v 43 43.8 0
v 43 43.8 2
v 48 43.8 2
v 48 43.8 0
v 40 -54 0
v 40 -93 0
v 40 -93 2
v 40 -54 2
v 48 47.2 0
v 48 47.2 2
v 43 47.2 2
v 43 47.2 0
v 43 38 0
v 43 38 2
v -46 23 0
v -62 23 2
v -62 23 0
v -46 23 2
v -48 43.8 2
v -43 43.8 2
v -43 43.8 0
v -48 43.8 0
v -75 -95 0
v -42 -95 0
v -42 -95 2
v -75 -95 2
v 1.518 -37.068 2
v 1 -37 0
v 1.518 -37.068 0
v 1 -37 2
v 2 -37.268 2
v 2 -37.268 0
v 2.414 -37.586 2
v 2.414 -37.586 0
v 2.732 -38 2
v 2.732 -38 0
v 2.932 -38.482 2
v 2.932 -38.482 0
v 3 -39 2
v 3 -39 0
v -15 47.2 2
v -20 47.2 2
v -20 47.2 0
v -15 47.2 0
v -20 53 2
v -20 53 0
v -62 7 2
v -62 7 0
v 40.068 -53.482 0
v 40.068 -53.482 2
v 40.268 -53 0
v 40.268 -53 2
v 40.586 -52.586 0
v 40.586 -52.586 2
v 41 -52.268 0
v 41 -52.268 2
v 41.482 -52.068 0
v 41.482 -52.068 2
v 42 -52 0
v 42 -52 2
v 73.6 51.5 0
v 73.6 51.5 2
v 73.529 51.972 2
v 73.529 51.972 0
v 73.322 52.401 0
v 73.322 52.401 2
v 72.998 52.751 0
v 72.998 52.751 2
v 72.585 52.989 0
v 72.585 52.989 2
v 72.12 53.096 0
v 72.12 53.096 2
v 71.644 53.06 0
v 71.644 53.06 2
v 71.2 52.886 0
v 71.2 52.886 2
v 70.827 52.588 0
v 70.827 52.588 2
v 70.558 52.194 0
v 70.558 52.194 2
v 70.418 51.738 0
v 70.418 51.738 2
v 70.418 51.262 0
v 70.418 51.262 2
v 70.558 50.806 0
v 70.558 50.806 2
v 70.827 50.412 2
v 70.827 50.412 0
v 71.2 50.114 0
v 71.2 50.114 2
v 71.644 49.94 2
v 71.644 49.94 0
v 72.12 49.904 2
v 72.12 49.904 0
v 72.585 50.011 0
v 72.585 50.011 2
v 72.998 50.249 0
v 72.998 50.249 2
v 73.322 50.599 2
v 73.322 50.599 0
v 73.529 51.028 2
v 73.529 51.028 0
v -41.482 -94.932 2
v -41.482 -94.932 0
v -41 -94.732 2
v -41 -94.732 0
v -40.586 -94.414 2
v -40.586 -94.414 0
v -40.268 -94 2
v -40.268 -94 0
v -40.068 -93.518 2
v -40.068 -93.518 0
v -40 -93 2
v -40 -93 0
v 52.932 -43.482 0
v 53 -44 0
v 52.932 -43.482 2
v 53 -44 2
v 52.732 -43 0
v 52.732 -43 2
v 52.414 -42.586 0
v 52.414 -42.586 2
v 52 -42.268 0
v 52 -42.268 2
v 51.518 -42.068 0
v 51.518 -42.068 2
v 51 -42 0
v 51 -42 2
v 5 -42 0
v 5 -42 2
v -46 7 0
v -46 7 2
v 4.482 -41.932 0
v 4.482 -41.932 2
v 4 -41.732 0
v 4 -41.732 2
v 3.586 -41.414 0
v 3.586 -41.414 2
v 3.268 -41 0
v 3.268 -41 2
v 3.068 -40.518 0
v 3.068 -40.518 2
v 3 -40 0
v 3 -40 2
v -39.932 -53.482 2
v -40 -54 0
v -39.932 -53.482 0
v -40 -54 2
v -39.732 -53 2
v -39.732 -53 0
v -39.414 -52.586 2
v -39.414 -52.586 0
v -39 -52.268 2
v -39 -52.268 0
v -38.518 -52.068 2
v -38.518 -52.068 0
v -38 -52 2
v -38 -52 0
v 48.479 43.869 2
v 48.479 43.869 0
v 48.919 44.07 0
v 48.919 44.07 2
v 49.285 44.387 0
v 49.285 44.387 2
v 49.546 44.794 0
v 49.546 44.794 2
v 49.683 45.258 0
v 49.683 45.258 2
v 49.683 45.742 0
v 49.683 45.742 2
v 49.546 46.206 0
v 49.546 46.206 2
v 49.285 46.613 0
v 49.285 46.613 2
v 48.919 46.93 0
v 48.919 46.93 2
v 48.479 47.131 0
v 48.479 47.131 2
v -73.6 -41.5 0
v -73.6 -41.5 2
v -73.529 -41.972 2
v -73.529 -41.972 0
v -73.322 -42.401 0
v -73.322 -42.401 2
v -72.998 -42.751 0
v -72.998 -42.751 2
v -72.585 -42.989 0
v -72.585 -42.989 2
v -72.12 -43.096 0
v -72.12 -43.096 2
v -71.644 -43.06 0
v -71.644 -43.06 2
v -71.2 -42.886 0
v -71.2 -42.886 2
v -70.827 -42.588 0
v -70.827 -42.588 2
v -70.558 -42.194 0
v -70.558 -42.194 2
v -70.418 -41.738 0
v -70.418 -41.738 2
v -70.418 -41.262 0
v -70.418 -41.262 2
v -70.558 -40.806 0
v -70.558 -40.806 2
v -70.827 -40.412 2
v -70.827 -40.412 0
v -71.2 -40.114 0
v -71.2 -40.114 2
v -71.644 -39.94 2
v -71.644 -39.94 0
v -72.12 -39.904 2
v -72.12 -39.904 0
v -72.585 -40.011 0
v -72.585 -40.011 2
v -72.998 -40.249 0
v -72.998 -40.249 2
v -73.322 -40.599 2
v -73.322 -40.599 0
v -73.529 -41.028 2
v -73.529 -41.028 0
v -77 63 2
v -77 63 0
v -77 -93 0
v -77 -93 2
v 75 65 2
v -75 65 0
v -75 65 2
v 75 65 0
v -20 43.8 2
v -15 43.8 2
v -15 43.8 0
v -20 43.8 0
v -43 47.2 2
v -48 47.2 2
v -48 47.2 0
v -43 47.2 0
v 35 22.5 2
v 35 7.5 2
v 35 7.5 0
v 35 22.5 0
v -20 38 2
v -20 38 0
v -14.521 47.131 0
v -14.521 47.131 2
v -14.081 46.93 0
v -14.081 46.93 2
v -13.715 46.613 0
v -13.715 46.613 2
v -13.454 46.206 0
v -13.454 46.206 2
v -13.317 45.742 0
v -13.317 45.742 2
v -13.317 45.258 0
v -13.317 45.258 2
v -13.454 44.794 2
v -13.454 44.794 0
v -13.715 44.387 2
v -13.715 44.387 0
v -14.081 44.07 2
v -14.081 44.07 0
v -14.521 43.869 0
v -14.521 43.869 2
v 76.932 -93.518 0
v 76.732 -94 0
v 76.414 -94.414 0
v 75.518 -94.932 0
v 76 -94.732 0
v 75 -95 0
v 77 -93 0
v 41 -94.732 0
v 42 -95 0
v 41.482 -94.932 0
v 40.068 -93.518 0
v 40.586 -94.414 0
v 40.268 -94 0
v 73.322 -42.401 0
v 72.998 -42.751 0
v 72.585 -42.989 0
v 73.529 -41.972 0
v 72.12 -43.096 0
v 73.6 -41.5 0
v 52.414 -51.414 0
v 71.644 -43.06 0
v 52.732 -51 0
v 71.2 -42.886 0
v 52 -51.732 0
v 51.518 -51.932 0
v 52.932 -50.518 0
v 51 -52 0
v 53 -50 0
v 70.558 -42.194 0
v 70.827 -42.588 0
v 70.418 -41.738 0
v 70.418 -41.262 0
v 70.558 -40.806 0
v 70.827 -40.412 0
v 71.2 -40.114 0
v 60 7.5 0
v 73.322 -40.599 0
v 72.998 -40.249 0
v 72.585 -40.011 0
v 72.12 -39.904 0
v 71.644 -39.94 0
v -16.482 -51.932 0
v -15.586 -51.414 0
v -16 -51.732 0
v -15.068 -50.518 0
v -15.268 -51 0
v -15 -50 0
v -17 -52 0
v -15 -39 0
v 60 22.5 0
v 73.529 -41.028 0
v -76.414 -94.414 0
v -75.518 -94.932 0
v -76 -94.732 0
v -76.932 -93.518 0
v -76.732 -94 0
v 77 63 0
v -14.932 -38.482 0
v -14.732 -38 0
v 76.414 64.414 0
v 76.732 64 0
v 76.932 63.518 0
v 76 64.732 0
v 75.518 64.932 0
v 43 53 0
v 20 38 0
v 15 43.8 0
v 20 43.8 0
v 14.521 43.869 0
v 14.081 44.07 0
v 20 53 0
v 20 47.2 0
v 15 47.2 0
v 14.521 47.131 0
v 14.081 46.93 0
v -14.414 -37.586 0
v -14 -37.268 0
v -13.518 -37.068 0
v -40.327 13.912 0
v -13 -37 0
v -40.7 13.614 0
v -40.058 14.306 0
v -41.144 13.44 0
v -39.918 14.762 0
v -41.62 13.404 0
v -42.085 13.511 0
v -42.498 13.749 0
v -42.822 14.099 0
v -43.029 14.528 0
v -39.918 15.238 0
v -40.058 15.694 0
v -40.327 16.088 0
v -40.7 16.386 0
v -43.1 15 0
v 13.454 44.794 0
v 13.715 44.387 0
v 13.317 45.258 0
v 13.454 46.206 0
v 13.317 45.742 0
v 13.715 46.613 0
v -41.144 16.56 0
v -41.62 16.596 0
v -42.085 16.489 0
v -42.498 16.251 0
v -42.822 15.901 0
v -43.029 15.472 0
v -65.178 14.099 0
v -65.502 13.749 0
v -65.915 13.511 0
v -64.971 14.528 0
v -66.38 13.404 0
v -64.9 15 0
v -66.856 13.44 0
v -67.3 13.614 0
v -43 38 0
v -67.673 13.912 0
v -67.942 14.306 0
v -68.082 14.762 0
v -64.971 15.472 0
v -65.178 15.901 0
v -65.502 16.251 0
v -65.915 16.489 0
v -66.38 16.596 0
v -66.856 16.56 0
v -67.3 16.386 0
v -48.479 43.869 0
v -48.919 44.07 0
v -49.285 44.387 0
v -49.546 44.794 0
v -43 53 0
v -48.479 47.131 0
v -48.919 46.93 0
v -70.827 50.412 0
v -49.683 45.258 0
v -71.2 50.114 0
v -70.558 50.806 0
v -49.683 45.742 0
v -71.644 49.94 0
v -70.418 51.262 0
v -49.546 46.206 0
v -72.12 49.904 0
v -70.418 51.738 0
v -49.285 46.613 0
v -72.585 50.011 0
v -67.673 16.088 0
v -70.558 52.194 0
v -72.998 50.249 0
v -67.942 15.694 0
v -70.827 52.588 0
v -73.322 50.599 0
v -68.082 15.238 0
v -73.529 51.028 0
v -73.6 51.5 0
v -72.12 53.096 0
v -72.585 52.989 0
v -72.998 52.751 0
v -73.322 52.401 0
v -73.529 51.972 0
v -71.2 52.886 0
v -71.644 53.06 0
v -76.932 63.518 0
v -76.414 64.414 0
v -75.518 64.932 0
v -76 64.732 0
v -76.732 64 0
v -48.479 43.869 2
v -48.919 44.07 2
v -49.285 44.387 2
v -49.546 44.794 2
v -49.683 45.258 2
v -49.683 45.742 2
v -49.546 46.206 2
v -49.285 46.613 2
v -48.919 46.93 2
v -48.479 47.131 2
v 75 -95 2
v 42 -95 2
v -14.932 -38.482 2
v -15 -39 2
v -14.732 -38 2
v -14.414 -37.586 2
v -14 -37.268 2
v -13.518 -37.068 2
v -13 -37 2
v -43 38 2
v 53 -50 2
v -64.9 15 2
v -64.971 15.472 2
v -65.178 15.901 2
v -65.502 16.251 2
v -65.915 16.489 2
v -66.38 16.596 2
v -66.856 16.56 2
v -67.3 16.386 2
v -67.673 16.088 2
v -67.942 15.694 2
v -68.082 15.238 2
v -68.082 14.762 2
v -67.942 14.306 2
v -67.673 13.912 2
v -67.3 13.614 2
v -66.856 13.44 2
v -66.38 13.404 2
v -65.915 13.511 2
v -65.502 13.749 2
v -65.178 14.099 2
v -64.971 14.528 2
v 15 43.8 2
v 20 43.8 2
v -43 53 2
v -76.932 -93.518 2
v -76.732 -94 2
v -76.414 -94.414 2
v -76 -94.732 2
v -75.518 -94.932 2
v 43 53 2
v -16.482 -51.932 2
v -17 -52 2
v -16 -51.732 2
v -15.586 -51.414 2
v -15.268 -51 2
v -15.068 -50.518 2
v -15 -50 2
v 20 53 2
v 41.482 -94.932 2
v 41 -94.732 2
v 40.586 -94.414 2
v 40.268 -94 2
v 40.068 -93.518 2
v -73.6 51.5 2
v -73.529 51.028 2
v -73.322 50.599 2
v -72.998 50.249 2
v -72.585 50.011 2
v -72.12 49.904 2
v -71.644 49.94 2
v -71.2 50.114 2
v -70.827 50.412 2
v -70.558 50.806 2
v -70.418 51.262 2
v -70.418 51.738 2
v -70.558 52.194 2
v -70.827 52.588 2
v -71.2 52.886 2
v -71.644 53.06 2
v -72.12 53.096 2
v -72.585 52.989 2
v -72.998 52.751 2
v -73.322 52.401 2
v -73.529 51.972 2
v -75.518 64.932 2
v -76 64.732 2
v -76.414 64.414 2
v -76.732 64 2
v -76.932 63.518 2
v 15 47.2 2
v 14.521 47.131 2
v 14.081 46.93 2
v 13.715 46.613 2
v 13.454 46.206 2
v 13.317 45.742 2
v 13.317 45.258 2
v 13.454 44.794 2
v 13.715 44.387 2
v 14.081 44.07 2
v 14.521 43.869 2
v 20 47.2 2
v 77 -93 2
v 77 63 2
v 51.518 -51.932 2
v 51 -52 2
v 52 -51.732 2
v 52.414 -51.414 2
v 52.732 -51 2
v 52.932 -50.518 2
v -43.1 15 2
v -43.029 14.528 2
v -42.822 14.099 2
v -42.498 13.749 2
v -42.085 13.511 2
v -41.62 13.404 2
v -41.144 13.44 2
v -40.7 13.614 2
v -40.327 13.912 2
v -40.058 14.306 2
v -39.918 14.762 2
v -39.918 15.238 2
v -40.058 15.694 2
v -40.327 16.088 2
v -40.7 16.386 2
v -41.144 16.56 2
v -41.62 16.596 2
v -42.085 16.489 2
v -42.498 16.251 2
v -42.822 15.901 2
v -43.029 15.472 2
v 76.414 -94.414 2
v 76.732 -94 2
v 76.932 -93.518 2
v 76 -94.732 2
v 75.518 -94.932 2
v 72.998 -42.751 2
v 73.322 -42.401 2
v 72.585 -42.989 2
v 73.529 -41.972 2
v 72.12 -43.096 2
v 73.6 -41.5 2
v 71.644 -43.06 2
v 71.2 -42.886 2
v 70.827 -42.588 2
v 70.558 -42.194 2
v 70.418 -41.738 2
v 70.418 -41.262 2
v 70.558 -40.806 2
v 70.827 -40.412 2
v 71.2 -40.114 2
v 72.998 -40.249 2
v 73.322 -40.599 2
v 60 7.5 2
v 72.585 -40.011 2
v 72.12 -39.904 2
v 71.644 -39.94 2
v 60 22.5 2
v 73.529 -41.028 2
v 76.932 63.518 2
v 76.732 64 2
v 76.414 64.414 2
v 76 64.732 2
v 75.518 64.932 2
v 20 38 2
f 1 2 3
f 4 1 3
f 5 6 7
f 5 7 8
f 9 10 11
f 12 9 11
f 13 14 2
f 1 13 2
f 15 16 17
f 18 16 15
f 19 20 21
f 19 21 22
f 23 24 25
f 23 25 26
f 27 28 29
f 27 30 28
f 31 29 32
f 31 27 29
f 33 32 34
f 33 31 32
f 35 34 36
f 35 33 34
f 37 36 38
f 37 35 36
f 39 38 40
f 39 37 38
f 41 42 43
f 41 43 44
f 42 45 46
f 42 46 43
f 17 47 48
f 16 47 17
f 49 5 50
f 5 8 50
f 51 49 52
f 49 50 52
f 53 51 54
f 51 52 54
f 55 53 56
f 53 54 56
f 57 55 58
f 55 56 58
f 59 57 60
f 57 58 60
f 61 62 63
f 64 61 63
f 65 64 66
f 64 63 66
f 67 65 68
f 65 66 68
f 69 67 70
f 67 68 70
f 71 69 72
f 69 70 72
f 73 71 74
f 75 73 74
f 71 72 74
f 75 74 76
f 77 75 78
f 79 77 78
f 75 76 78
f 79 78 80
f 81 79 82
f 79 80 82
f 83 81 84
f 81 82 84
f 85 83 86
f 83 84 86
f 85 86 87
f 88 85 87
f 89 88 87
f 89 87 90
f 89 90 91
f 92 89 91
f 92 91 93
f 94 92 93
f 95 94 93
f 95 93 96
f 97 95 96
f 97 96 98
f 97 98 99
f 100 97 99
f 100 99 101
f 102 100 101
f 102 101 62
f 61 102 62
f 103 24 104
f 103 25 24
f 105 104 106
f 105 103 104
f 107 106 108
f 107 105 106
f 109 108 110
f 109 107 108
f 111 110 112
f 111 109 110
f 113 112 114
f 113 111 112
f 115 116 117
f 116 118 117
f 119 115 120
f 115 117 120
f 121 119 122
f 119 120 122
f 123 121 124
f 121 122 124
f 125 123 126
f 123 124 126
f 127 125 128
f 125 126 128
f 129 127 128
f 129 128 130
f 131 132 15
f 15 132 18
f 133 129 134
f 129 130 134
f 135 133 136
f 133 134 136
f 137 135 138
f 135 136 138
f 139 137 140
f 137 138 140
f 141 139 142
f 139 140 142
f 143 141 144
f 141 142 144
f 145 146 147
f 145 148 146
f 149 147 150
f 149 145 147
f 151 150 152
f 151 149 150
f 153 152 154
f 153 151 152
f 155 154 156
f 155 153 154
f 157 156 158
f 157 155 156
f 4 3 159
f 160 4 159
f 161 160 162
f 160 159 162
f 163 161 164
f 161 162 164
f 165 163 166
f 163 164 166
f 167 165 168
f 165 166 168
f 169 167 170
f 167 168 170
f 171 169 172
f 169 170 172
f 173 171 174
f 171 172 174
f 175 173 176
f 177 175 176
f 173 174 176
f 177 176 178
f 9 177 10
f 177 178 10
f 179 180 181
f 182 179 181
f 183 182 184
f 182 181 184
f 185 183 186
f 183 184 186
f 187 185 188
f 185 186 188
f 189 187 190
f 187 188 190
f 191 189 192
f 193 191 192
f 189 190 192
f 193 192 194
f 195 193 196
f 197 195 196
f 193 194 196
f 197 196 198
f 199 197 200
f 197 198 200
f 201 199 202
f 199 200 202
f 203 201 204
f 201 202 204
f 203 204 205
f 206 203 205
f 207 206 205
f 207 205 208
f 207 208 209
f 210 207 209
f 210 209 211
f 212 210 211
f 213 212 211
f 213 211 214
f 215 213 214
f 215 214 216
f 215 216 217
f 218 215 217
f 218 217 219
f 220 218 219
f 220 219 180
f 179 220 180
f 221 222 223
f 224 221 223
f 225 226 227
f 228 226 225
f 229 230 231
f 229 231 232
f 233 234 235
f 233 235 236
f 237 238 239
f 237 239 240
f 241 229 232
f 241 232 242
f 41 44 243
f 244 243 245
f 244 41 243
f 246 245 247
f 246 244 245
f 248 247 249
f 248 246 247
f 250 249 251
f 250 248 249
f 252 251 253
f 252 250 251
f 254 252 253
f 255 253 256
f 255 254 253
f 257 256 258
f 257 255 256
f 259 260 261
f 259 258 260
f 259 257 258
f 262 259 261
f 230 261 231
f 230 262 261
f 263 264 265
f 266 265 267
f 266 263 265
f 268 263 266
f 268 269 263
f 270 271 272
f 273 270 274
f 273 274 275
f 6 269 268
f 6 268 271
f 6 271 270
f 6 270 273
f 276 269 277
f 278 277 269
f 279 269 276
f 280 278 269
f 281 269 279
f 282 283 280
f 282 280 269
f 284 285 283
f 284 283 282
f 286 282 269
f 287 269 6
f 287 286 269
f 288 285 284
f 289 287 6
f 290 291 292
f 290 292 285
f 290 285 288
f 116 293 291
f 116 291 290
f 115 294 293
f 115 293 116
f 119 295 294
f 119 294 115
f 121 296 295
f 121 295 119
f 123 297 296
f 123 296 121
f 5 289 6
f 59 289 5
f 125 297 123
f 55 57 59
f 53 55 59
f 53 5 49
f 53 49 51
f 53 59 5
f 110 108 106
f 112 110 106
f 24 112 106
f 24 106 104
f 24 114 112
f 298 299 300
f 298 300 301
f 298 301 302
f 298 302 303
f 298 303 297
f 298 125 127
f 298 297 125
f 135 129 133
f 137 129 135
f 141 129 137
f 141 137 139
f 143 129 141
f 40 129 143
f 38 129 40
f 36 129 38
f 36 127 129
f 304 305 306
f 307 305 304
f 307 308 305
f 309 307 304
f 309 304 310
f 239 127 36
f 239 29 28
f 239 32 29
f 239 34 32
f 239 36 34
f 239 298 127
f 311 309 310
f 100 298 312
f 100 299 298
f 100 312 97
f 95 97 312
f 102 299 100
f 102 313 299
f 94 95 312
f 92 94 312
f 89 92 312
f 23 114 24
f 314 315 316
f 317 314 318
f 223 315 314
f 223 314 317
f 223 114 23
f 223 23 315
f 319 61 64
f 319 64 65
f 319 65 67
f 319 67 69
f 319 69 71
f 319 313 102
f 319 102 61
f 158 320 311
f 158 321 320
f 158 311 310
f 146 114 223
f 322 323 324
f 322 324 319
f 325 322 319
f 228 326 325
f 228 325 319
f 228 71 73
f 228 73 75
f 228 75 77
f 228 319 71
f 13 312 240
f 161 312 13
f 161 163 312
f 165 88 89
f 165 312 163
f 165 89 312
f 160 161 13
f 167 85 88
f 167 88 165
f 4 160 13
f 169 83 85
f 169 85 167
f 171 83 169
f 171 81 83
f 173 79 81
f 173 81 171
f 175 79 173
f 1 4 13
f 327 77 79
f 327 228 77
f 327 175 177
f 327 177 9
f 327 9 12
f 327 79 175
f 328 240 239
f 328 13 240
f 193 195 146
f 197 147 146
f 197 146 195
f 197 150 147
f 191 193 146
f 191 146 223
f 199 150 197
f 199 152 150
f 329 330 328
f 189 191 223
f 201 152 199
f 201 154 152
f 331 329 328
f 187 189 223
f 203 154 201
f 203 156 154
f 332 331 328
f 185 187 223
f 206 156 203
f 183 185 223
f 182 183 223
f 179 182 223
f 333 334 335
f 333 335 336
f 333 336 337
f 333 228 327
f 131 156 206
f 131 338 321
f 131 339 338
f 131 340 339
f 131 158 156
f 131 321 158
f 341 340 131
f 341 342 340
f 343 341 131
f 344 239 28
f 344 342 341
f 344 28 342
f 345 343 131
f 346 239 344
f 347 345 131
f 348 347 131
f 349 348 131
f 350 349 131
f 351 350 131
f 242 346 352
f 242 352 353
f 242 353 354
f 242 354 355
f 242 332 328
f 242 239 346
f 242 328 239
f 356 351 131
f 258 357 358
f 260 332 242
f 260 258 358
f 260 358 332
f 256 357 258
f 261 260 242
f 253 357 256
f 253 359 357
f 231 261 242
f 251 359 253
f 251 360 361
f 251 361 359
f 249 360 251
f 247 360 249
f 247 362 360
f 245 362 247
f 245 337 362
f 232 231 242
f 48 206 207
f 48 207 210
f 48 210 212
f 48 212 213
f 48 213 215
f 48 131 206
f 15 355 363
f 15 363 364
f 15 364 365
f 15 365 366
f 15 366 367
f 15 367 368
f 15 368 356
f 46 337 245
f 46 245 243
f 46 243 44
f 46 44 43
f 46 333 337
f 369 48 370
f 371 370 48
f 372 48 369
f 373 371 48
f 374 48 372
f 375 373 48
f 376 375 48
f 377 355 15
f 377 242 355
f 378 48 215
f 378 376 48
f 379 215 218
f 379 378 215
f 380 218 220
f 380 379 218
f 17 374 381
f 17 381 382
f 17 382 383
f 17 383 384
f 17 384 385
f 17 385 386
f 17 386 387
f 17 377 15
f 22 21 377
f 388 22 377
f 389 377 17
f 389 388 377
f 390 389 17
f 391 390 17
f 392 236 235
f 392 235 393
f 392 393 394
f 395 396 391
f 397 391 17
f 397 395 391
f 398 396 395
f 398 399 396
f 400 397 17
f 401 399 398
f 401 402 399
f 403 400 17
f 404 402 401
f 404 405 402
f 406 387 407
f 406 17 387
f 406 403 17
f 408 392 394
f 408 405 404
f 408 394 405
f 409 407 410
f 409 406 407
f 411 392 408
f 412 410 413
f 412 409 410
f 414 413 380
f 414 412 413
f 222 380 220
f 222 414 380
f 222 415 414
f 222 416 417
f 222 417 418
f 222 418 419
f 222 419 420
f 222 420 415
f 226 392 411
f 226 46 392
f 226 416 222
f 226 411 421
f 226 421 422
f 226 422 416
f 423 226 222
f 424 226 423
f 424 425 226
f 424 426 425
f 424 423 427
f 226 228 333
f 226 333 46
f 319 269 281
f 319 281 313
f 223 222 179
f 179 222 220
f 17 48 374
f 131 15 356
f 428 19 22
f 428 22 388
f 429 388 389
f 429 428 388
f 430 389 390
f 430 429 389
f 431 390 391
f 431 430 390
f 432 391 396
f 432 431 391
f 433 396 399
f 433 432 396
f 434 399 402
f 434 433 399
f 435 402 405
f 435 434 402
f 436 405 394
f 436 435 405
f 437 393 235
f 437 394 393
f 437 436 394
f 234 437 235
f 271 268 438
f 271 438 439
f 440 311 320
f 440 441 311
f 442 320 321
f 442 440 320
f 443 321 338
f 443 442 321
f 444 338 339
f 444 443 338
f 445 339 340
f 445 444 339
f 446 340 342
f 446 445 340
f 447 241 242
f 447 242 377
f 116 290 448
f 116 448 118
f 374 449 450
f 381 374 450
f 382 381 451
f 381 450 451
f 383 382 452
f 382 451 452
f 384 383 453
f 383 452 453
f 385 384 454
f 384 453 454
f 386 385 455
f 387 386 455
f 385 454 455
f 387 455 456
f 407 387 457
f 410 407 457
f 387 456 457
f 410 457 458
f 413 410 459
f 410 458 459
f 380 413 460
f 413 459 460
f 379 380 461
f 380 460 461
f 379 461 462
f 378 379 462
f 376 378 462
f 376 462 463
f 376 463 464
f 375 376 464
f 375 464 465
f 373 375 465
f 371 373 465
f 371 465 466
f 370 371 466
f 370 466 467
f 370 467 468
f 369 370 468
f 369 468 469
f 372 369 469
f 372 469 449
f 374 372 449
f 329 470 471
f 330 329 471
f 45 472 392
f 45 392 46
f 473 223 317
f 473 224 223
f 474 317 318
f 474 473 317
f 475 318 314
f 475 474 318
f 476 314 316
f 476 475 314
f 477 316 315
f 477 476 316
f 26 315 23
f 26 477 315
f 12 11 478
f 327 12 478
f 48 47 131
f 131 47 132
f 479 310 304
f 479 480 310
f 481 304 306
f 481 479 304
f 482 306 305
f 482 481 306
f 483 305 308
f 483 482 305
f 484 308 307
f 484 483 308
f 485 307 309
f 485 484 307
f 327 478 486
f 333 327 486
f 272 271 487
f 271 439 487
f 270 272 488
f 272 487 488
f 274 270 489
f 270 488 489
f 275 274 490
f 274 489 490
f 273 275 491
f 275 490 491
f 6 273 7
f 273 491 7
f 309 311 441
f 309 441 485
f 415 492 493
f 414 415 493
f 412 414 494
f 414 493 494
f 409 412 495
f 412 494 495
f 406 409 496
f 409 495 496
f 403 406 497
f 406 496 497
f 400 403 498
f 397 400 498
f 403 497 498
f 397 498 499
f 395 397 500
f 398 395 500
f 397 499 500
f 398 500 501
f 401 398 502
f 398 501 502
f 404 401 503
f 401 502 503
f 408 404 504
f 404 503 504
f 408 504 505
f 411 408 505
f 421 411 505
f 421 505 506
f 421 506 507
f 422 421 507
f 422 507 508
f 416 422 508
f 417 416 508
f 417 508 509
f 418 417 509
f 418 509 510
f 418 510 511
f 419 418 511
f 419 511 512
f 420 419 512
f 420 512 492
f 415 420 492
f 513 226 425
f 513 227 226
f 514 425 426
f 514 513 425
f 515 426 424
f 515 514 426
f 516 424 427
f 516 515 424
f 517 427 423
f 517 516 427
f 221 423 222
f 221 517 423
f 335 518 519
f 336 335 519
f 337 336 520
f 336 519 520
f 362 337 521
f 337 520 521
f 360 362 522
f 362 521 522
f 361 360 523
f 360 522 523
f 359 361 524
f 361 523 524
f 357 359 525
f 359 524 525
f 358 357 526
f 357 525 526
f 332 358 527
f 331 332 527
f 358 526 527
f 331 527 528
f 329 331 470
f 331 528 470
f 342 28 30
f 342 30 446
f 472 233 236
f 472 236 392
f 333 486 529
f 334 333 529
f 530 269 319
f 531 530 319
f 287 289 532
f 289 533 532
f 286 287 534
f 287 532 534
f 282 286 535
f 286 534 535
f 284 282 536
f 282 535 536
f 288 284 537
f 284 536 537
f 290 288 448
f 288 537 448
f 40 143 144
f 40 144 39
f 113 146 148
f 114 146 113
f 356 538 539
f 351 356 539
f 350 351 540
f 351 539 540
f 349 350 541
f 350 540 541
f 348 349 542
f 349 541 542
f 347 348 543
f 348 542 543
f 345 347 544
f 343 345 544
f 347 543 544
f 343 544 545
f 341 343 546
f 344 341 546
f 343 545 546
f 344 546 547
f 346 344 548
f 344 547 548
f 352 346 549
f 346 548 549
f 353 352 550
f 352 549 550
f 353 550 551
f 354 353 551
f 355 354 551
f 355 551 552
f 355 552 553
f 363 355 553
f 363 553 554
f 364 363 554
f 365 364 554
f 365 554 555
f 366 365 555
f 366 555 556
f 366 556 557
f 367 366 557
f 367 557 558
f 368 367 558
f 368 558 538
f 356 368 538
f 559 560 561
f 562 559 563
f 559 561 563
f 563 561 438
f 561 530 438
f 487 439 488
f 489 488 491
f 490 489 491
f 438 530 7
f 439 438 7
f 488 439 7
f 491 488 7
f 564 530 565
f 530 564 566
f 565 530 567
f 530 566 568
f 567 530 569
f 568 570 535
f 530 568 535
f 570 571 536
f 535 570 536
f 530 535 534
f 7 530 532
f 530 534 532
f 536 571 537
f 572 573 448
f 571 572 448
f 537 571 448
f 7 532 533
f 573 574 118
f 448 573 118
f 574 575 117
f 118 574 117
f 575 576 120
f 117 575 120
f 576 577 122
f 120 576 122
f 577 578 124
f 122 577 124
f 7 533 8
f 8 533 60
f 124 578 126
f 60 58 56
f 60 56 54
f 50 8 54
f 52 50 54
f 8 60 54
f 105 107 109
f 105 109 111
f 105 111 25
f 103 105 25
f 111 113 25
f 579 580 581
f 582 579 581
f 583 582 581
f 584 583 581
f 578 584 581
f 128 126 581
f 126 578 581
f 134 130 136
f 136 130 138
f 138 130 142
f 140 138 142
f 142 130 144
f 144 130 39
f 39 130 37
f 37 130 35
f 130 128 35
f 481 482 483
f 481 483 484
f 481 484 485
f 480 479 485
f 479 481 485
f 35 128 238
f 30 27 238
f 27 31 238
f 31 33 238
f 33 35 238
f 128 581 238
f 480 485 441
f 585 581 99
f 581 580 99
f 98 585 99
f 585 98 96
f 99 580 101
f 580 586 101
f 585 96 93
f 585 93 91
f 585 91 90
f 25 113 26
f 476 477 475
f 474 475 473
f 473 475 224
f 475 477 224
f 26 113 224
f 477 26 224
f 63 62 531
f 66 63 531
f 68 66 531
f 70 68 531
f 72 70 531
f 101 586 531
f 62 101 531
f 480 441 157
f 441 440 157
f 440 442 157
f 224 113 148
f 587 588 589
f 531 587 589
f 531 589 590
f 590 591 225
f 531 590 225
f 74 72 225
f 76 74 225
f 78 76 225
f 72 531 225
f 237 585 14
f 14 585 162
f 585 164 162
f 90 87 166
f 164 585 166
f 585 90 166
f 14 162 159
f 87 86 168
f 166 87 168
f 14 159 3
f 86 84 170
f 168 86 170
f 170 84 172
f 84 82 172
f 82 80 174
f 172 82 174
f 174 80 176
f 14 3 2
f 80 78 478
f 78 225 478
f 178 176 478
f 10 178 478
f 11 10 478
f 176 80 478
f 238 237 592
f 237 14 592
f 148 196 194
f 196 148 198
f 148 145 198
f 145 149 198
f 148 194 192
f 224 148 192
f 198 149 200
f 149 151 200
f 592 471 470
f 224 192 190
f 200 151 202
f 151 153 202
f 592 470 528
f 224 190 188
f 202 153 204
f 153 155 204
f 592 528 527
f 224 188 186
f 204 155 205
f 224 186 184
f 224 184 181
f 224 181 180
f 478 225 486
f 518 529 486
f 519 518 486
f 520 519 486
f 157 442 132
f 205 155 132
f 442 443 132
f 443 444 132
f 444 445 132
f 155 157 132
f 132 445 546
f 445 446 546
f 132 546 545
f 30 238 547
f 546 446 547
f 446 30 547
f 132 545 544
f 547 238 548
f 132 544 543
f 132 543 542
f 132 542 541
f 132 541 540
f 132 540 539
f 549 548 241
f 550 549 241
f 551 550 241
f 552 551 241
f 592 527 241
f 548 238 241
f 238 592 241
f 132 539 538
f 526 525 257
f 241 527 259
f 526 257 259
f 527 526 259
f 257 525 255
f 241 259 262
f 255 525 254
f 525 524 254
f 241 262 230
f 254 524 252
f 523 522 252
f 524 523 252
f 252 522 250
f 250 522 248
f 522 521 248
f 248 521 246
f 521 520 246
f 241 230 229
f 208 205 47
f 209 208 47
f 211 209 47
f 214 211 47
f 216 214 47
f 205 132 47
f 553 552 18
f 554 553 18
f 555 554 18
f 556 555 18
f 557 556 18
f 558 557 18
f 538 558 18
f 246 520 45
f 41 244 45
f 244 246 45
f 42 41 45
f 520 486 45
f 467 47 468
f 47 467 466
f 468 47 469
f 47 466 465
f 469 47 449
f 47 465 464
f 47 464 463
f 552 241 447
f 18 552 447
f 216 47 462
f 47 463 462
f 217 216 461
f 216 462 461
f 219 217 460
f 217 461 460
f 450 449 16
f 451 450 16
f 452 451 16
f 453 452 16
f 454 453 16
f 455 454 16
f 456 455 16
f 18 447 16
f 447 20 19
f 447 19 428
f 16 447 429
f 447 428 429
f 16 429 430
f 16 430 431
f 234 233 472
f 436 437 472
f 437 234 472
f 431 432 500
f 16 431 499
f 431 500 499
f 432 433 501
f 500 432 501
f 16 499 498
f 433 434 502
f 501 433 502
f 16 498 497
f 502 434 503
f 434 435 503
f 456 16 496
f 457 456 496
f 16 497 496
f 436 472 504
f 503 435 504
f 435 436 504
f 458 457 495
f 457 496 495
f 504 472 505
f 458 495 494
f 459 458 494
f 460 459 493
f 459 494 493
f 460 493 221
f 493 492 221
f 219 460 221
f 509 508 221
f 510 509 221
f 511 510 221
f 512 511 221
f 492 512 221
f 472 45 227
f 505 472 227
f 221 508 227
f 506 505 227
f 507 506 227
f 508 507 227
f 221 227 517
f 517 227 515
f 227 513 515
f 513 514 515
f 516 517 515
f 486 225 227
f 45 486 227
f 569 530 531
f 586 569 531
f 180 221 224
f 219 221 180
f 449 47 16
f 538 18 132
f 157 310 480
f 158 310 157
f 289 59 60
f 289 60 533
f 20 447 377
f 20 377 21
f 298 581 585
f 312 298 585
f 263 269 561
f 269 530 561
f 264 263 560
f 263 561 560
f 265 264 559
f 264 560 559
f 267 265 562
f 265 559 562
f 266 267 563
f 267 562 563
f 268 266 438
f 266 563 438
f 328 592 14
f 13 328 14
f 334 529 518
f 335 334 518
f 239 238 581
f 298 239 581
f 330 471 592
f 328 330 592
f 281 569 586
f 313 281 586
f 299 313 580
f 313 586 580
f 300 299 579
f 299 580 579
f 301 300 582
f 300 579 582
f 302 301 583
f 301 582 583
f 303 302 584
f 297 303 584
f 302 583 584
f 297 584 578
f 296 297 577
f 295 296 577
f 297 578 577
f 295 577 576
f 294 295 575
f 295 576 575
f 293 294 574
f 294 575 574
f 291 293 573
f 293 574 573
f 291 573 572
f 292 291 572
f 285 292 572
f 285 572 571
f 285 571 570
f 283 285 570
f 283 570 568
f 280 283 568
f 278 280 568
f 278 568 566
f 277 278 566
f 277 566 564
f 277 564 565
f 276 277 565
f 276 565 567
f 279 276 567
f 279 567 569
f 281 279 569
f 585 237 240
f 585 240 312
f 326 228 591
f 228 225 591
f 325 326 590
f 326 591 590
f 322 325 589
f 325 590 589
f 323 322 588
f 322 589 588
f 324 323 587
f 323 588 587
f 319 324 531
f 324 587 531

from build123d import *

# Parameters (mm, degrees)
EXTRUDE_1_DEPTH     = 2
CUT_EXTRUDE_2_REACH = 124.303
SKETCH_3_R          = 1.6
SKETCH_3_W          = 16
SKETCH_3_H          = 16
CUT_EXTRUDE_4_REACH = 124.303
SKETCH_5_R          = 1.6
FILLET_1_R          = 2
SKETCH_6_W          = 25
SKETCH_6_H          = 15
CUT_EXTRUDE_5_DEPTH = 123.302902664
CUT_EXTRUDE_6_DEPTH = 123.302902664


with BuildPart() as part:
    # 草图1 → 凸台-拉伸1 (new body)
    with BuildSketch(Plane.XY):
        Polygon((-77, 65), (77, 65), (77, -65), (77, -95), (40, -95), (40, -52), (53, -52), (53, -42), (3, -42), (3, -37), (-15, -37), (-15, -52), (-40, -52), (-40, -95), (-77, -95), (-77, -65), align=None)
    extrude(amount=EXTRUDE_1_DEPTH)

    # 草图3 → 切除-拉伸2 (cut, up to next)
    with BuildSketch(Plane.XY.offset(2), mode=Mode.PRIVATE) as cut_extrude_2_sk1:
        with Locations((-66.5, 15)):
            Circle(SKETCH_3_R)
    cut_extrude_2_tool1 = extrude(cut_extrude_2_sk1.sketch, amount=-CUT_EXTRUDE_2_REACH, mode=Mode.PRIVATE) & part.part
    # 草图3 → 切除-拉伸2 (cut, up to next)
    with BuildSketch(Plane.XY.offset(2), mode=Mode.PRIVATE) as cut_extrude_2_sk2:
        with Locations(Location((-41.5, 15, 0), (0, 0, 180))):
            Circle(SKETCH_3_R)
    cut_extrude_2_tool2 = extrude(cut_extrude_2_sk2.sketch, amount=-CUT_EXTRUDE_2_REACH, mode=Mode.PRIVATE) & part.part
    # 草图3 → 切除-拉伸2 (cut, up to next)
    with BuildSketch(Plane.XY.offset(2), mode=Mode.PRIVATE) as cut_extrude_2_sk3:
        with Locations((-54, 15)):
            Rectangle(SKETCH_3_W, SKETCH_3_H)
    cut_extrude_2_tool3 = extrude(cut_extrude_2_sk3.sketch, amount=-CUT_EXTRUDE_2_REACH, mode=Mode.PRIVATE) & part.part
    add(cut_extrude_2_tool1.solids().sort_by_distance((-66.5, 15, 2))[0], mode=Mode.SUBTRACT)
    add(cut_extrude_2_tool2.solids().sort_by_distance((-41.5, 15, 2))[0], mode=Mode.SUBTRACT)
    add(cut_extrude_2_tool3.solids().sort_by_distance((-54, 15, 2))[0], mode=Mode.SUBTRACT)

    # 草图5 → 切除-拉伸4 (cut, up to next)
    with BuildSketch(Plane.XY.offset(2), mode=Mode.PRIVATE) as cut_extrude_4_sk1:
        with Locations((72, -41.5)):
            Circle(SKETCH_5_R)
    cut_extrude_4_tool1 = extrude(cut_extrude_4_sk1.sketch, amount=-CUT_EXTRUDE_4_REACH, mode=Mode.PRIVATE) & part.part
    # 草图5 → 切除-拉伸4 (cut, up to next)
    with BuildSketch(Plane.XY.offset(2), mode=Mode.PRIVATE) as cut_extrude_4_sk2:
        with Locations((72, 51.5)):
            Circle(SKETCH_5_R)
    cut_extrude_4_tool2 = extrude(cut_extrude_4_sk2.sketch, amount=-CUT_EXTRUDE_4_REACH, mode=Mode.PRIVATE) & part.part
    # 草图5 → 切除-拉伸4 (cut, up to next)
    with BuildSketch(Plane.XY.offset(2), mode=Mode.PRIVATE) as cut_extrude_4_sk3:
        with Locations(Location((-72, 51.5, 0), (0, 0, 180))):
            Circle(SKETCH_5_R)
    cut_extrude_4_tool3 = extrude(cut_extrude_4_sk3.sketch, amount=-CUT_EXTRUDE_4_REACH, mode=Mode.PRIVATE) & part.part
    # 草图5 → 切除-拉伸4 (cut, up to next)
    with BuildSketch(Plane.XY.offset(2), mode=Mode.PRIVATE) as cut_extrude_4_sk4:
        with Locations(Location((-72, -41.5, 0), (0, 0, 180))):
            Circle(SKETCH_5_R)
    cut_extrude_4_tool4 = extrude(cut_extrude_4_sk4.sketch, amount=-CUT_EXTRUDE_4_REACH, mode=Mode.PRIVATE) & part.part
    add(cut_extrude_4_tool1.solids().sort_by_distance((72, -41.5, 2))[0], mode=Mode.SUBTRACT)
    add(cut_extrude_4_tool2.solids().sort_by_distance((72, 51.5, 2))[0], mode=Mode.SUBTRACT)
    add(cut_extrude_4_tool3.solids().sort_by_distance((-72, 51.5, 2))[0], mode=Mode.SUBTRACT)
    add(cut_extrude_4_tool4.solids().sort_by_distance((-72, -41.5, 2))[0], mode=Mode.SUBTRACT)

    # 圆角1
    fillet_1_edges = [part.edges().sort_by_distance(p)[0] for p in [
        (77, -95, 1),
        (40, -95, 1),
        (40, -52, 1),
        (53, -52, 1),
        (53, -42, 1),
        (3, -42, 1),
        (3, -37, 1),
        (-15, -37, 1),
        (-15, -52, 1),
        (-40, -52, 1),
        (-40, -95, 1),
        (-77, -95, 1),
        (-77, 65, 1),
        (77, 65, 1),
    ]]
    fillet(fillet_1_edges, radius=FILLET_1_R)

    # 草图6 → 切除-拉伸5 (cut, through all)
    with BuildSketch(Plane.XY.offset(2)):
        with Locations((47.5, 15)):
            Rectangle(SKETCH_6_W, SKETCH_6_H)
    extrude(amount=-CUT_EXTRUDE_5_DEPTH, mode=Mode.SUBTRACT)

    # 草图7 → 切除-拉伸6 (cut, through all)
    with BuildSketch(Plane.XY.offset(2)):
        with BuildLine():
            Line((-43, 53), (-20, 53))
            Line((-20, 53), (-20, 47.2))
            Line((-20, 47.2), (-15, 47.2))
            ThreePointArc((-15, 47.2), (-13.3, 45.5), (-15, 43.8))
            Line((-15, 43.8), (-20, 43.8))
            Line((-20, 43.8), (-20, 38))
            Line((-20, 38), (-43, 38))
            Line((-43, 38), (-43, 43.8))
            Line((-43, 43.8), (-48, 43.8))
            ThreePointArc((-48, 43.8), (-49.7, 45.5), (-48, 47.2))
            Line((-48, 47.2), (-43, 47.2))
            Line((-43, 47.2), (-43, 53))
        make_face()
        with BuildLine():
            Line((20, 43.8), (20, 38))
            Line((20, 38), (43, 38))
            Line((43, 38), (43, 43.8))
            Line((43, 43.8), (48, 43.8))
            ThreePointArc((48, 43.8), (49.7, 45.5), (48, 47.2))
            Line((48, 47.2), (43, 47.2))
            Line((43, 47.2), (43, 53))
            Line((43, 53), (20, 53))
            Line((20, 53), (20, 47.2))
            Line((20, 47.2), (15, 47.2))
            ThreePointArc((15, 47.2), (13.3, 45.5), (15, 43.8))
            Line((15, 43.8), (20, 43.8))
        make_face()
    extrude(amount=-CUT_EXTRUDE_6_DEPTH, mode=Mode.SUBTRACT)


solid = part.part
